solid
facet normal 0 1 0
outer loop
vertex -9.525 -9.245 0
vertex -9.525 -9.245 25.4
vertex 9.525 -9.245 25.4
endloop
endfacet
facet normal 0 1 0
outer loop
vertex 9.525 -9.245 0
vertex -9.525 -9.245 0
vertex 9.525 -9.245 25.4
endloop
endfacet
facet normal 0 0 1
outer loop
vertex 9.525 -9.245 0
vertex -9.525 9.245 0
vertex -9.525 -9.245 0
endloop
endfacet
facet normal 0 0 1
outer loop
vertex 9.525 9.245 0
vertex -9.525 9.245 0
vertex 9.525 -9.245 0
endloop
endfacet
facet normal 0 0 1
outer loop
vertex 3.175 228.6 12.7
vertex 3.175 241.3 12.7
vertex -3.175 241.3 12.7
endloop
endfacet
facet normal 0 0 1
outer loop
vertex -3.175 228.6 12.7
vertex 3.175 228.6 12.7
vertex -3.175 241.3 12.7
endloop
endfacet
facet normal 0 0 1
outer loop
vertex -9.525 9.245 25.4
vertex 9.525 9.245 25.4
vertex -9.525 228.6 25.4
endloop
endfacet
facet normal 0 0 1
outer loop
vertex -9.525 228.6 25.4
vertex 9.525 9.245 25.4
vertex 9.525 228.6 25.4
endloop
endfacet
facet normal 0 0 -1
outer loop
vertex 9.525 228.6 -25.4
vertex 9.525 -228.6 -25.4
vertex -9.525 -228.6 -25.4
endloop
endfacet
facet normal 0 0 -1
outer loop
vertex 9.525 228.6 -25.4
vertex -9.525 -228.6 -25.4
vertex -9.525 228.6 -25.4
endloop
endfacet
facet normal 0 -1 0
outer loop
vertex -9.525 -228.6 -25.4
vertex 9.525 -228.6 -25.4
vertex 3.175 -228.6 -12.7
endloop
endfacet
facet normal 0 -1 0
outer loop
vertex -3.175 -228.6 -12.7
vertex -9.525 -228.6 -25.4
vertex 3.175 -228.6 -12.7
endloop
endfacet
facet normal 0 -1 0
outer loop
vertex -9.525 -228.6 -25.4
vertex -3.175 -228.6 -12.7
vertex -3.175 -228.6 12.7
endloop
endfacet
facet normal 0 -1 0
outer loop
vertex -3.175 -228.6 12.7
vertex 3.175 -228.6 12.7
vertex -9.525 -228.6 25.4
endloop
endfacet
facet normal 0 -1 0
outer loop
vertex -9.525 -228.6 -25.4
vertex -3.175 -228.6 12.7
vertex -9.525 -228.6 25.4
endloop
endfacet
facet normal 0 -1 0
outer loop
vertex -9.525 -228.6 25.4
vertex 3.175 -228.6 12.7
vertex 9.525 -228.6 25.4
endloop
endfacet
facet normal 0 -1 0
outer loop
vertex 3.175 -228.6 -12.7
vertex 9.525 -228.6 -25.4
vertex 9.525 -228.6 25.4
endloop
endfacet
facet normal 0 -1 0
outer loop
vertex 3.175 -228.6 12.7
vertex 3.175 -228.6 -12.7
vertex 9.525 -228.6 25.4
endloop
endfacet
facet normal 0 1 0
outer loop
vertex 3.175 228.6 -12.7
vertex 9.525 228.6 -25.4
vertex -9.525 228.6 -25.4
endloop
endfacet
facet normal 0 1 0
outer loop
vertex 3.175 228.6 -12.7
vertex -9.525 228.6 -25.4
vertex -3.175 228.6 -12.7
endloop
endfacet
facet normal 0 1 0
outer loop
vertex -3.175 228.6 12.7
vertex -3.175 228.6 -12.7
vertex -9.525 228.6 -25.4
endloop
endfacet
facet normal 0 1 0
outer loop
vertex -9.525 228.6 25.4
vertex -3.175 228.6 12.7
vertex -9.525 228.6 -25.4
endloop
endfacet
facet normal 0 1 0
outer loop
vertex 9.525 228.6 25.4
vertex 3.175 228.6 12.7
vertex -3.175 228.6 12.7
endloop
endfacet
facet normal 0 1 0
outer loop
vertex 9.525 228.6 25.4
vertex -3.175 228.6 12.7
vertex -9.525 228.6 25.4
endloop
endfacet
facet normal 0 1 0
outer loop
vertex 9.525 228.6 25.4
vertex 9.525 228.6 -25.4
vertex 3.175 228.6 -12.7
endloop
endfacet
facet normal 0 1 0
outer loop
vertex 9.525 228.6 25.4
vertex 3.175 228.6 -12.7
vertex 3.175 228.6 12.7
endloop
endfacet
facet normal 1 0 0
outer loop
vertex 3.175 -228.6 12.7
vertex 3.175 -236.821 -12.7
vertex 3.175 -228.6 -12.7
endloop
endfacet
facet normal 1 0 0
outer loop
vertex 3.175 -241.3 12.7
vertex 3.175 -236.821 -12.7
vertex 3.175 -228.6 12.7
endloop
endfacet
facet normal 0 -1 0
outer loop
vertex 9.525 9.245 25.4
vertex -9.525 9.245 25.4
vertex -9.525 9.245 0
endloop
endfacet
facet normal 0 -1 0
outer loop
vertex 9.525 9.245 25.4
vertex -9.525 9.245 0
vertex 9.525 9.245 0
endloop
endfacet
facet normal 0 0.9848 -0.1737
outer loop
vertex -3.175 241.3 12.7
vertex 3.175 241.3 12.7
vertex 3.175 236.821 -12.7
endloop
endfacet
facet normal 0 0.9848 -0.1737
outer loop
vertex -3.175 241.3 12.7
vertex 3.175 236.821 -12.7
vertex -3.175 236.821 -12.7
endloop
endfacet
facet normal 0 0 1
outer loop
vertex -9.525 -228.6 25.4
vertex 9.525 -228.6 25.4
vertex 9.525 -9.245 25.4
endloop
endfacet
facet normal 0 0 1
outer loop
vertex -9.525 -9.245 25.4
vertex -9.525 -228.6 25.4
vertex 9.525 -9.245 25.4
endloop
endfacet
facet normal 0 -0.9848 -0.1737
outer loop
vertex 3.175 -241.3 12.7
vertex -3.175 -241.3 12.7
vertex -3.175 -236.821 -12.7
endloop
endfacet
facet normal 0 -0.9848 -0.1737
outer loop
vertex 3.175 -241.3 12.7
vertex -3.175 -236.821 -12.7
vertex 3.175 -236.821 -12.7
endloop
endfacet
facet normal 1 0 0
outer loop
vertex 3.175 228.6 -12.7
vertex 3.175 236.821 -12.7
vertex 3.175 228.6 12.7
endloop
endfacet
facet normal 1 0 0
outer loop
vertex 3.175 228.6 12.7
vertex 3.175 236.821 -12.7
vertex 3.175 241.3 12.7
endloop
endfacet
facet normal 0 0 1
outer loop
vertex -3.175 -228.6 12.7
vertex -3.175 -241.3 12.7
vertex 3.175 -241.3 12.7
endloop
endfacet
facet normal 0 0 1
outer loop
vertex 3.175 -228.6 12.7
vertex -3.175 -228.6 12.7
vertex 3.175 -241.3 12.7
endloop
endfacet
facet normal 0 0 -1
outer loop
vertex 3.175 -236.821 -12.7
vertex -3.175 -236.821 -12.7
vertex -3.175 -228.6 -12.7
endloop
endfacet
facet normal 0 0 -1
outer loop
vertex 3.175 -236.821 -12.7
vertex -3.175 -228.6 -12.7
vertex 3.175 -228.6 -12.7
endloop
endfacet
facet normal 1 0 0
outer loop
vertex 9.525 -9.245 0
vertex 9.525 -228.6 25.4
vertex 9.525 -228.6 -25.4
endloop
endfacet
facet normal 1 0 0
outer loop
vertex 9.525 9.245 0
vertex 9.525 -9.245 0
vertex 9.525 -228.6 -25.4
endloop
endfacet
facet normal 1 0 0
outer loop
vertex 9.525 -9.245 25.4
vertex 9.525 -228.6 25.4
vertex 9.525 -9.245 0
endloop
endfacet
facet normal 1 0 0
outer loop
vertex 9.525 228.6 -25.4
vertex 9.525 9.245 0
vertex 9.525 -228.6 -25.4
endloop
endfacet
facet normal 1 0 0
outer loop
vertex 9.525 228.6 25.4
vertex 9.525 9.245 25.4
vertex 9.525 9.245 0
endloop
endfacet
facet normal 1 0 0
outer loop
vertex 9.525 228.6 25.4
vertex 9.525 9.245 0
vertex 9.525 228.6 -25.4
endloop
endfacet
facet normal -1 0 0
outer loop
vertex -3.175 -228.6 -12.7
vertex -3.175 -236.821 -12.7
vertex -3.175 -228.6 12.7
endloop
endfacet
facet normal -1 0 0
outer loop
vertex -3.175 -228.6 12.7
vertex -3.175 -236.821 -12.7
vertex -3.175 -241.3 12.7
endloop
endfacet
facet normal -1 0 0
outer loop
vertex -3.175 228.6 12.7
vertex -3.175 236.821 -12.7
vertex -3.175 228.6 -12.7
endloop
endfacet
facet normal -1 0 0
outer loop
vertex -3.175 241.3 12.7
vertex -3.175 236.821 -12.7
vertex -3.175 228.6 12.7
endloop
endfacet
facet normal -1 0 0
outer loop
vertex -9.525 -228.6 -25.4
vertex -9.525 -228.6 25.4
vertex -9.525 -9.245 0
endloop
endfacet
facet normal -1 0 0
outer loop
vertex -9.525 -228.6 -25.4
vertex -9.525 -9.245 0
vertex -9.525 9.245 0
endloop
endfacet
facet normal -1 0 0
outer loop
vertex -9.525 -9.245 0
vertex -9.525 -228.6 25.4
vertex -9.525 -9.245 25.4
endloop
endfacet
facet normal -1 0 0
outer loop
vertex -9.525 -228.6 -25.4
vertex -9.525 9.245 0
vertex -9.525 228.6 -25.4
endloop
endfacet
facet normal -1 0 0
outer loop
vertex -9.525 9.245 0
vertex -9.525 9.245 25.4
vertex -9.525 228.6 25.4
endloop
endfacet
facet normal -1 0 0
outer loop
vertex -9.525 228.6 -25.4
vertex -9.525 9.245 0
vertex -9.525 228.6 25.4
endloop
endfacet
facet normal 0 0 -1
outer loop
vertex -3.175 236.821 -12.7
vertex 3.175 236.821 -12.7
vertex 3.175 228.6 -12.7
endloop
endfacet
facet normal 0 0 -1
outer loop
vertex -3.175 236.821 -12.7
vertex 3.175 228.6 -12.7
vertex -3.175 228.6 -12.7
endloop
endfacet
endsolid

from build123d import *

# Parameters (mm, degrees)
F0_W     = 457.2
F0_H     = 50.8
F1_DEPTH = 9.525
F2_W     = 19.05
F2_H     = 18.4890627861
F3_DEPTH = 25.4
F4_W     = 6.35
F4_H     = 25.4
F5_DEPTH = 12.7
F6_W     = 6.35
F6_H     = 25.4
F7_DEPTH = 12.7
F8_SIZE2 = 4.478695
F8_SIZE  = 25.39999
F9_SIZE2 = 4.478695
F9_SIZE  = 25.39999


# Not quite as in the source:
# - a fillet or chamfer is up to 0.001 mm smaller than in the source, because OpenCascade refuses the exact size


with BuildPart() as f1:
    # F0 (on Right) → F1 (new body, symmetric)
    with BuildSketch(Plane.YZ):
        Rectangle(F0_W, F0_H)
    extrude(amount=F1_DEPTH, both=True)

    # F2 (on face) → F3 (cut, symmetric)
    with BuildSketch(Plane.XY.offset(25.4)):
        Rectangle(F2_W, F2_H)
    extrude(amount=F3_DEPTH, both=True, mode=Mode.SUBTRACT)

    # F4 (on face) → F5 (join, symmetric)
    with BuildSketch(Plane.XZ.offset(228.6)):
        Rectangle(F4_W, F4_H)
    extrude(amount=F5_DEPTH, both=True)

    # F6 (on face) → F7 (join, symmetric)
    with BuildSketch(Plane(origin=(0, 228.6, 0), x_dir=(-1, 0, 0), z_dir=(0, 1, 0))):
        Rectangle(F6_W, F6_H)
    extrude(amount=F7_DEPTH, both=True)

    # F8 (size 25.4 and 4.47870531 in the source; OpenCascade refuses exactly that, so slightly less here)
    f8_edges = [f1.edges().sort_by_distance(p)[0] for p in [
        (0, 241.3, -12.7),
    ]]
    f8_side = f1.faces().sort_by_distance((0, 241.3, 0))[0]
    chamfer(f8_edges, length=F8_SIZE, length2=F8_SIZE2, reference=f8_side)

    # F9 (size 25.4 and 4.47870531 in the source; OpenCascade refuses exactly that, so slightly less here)
    f9_edges = [f1.edges().sort_by_distance(p)[0] for p in [
        (0, -241.3, -12.7),
    ]]
    f9_side = f1.faces().sort_by_distance((0, -241.3, 0))[0]
    chamfer(f9_edges, length=F9_SIZE, length2=F9_SIZE2, reference=f9_side)


solid = f1.part
